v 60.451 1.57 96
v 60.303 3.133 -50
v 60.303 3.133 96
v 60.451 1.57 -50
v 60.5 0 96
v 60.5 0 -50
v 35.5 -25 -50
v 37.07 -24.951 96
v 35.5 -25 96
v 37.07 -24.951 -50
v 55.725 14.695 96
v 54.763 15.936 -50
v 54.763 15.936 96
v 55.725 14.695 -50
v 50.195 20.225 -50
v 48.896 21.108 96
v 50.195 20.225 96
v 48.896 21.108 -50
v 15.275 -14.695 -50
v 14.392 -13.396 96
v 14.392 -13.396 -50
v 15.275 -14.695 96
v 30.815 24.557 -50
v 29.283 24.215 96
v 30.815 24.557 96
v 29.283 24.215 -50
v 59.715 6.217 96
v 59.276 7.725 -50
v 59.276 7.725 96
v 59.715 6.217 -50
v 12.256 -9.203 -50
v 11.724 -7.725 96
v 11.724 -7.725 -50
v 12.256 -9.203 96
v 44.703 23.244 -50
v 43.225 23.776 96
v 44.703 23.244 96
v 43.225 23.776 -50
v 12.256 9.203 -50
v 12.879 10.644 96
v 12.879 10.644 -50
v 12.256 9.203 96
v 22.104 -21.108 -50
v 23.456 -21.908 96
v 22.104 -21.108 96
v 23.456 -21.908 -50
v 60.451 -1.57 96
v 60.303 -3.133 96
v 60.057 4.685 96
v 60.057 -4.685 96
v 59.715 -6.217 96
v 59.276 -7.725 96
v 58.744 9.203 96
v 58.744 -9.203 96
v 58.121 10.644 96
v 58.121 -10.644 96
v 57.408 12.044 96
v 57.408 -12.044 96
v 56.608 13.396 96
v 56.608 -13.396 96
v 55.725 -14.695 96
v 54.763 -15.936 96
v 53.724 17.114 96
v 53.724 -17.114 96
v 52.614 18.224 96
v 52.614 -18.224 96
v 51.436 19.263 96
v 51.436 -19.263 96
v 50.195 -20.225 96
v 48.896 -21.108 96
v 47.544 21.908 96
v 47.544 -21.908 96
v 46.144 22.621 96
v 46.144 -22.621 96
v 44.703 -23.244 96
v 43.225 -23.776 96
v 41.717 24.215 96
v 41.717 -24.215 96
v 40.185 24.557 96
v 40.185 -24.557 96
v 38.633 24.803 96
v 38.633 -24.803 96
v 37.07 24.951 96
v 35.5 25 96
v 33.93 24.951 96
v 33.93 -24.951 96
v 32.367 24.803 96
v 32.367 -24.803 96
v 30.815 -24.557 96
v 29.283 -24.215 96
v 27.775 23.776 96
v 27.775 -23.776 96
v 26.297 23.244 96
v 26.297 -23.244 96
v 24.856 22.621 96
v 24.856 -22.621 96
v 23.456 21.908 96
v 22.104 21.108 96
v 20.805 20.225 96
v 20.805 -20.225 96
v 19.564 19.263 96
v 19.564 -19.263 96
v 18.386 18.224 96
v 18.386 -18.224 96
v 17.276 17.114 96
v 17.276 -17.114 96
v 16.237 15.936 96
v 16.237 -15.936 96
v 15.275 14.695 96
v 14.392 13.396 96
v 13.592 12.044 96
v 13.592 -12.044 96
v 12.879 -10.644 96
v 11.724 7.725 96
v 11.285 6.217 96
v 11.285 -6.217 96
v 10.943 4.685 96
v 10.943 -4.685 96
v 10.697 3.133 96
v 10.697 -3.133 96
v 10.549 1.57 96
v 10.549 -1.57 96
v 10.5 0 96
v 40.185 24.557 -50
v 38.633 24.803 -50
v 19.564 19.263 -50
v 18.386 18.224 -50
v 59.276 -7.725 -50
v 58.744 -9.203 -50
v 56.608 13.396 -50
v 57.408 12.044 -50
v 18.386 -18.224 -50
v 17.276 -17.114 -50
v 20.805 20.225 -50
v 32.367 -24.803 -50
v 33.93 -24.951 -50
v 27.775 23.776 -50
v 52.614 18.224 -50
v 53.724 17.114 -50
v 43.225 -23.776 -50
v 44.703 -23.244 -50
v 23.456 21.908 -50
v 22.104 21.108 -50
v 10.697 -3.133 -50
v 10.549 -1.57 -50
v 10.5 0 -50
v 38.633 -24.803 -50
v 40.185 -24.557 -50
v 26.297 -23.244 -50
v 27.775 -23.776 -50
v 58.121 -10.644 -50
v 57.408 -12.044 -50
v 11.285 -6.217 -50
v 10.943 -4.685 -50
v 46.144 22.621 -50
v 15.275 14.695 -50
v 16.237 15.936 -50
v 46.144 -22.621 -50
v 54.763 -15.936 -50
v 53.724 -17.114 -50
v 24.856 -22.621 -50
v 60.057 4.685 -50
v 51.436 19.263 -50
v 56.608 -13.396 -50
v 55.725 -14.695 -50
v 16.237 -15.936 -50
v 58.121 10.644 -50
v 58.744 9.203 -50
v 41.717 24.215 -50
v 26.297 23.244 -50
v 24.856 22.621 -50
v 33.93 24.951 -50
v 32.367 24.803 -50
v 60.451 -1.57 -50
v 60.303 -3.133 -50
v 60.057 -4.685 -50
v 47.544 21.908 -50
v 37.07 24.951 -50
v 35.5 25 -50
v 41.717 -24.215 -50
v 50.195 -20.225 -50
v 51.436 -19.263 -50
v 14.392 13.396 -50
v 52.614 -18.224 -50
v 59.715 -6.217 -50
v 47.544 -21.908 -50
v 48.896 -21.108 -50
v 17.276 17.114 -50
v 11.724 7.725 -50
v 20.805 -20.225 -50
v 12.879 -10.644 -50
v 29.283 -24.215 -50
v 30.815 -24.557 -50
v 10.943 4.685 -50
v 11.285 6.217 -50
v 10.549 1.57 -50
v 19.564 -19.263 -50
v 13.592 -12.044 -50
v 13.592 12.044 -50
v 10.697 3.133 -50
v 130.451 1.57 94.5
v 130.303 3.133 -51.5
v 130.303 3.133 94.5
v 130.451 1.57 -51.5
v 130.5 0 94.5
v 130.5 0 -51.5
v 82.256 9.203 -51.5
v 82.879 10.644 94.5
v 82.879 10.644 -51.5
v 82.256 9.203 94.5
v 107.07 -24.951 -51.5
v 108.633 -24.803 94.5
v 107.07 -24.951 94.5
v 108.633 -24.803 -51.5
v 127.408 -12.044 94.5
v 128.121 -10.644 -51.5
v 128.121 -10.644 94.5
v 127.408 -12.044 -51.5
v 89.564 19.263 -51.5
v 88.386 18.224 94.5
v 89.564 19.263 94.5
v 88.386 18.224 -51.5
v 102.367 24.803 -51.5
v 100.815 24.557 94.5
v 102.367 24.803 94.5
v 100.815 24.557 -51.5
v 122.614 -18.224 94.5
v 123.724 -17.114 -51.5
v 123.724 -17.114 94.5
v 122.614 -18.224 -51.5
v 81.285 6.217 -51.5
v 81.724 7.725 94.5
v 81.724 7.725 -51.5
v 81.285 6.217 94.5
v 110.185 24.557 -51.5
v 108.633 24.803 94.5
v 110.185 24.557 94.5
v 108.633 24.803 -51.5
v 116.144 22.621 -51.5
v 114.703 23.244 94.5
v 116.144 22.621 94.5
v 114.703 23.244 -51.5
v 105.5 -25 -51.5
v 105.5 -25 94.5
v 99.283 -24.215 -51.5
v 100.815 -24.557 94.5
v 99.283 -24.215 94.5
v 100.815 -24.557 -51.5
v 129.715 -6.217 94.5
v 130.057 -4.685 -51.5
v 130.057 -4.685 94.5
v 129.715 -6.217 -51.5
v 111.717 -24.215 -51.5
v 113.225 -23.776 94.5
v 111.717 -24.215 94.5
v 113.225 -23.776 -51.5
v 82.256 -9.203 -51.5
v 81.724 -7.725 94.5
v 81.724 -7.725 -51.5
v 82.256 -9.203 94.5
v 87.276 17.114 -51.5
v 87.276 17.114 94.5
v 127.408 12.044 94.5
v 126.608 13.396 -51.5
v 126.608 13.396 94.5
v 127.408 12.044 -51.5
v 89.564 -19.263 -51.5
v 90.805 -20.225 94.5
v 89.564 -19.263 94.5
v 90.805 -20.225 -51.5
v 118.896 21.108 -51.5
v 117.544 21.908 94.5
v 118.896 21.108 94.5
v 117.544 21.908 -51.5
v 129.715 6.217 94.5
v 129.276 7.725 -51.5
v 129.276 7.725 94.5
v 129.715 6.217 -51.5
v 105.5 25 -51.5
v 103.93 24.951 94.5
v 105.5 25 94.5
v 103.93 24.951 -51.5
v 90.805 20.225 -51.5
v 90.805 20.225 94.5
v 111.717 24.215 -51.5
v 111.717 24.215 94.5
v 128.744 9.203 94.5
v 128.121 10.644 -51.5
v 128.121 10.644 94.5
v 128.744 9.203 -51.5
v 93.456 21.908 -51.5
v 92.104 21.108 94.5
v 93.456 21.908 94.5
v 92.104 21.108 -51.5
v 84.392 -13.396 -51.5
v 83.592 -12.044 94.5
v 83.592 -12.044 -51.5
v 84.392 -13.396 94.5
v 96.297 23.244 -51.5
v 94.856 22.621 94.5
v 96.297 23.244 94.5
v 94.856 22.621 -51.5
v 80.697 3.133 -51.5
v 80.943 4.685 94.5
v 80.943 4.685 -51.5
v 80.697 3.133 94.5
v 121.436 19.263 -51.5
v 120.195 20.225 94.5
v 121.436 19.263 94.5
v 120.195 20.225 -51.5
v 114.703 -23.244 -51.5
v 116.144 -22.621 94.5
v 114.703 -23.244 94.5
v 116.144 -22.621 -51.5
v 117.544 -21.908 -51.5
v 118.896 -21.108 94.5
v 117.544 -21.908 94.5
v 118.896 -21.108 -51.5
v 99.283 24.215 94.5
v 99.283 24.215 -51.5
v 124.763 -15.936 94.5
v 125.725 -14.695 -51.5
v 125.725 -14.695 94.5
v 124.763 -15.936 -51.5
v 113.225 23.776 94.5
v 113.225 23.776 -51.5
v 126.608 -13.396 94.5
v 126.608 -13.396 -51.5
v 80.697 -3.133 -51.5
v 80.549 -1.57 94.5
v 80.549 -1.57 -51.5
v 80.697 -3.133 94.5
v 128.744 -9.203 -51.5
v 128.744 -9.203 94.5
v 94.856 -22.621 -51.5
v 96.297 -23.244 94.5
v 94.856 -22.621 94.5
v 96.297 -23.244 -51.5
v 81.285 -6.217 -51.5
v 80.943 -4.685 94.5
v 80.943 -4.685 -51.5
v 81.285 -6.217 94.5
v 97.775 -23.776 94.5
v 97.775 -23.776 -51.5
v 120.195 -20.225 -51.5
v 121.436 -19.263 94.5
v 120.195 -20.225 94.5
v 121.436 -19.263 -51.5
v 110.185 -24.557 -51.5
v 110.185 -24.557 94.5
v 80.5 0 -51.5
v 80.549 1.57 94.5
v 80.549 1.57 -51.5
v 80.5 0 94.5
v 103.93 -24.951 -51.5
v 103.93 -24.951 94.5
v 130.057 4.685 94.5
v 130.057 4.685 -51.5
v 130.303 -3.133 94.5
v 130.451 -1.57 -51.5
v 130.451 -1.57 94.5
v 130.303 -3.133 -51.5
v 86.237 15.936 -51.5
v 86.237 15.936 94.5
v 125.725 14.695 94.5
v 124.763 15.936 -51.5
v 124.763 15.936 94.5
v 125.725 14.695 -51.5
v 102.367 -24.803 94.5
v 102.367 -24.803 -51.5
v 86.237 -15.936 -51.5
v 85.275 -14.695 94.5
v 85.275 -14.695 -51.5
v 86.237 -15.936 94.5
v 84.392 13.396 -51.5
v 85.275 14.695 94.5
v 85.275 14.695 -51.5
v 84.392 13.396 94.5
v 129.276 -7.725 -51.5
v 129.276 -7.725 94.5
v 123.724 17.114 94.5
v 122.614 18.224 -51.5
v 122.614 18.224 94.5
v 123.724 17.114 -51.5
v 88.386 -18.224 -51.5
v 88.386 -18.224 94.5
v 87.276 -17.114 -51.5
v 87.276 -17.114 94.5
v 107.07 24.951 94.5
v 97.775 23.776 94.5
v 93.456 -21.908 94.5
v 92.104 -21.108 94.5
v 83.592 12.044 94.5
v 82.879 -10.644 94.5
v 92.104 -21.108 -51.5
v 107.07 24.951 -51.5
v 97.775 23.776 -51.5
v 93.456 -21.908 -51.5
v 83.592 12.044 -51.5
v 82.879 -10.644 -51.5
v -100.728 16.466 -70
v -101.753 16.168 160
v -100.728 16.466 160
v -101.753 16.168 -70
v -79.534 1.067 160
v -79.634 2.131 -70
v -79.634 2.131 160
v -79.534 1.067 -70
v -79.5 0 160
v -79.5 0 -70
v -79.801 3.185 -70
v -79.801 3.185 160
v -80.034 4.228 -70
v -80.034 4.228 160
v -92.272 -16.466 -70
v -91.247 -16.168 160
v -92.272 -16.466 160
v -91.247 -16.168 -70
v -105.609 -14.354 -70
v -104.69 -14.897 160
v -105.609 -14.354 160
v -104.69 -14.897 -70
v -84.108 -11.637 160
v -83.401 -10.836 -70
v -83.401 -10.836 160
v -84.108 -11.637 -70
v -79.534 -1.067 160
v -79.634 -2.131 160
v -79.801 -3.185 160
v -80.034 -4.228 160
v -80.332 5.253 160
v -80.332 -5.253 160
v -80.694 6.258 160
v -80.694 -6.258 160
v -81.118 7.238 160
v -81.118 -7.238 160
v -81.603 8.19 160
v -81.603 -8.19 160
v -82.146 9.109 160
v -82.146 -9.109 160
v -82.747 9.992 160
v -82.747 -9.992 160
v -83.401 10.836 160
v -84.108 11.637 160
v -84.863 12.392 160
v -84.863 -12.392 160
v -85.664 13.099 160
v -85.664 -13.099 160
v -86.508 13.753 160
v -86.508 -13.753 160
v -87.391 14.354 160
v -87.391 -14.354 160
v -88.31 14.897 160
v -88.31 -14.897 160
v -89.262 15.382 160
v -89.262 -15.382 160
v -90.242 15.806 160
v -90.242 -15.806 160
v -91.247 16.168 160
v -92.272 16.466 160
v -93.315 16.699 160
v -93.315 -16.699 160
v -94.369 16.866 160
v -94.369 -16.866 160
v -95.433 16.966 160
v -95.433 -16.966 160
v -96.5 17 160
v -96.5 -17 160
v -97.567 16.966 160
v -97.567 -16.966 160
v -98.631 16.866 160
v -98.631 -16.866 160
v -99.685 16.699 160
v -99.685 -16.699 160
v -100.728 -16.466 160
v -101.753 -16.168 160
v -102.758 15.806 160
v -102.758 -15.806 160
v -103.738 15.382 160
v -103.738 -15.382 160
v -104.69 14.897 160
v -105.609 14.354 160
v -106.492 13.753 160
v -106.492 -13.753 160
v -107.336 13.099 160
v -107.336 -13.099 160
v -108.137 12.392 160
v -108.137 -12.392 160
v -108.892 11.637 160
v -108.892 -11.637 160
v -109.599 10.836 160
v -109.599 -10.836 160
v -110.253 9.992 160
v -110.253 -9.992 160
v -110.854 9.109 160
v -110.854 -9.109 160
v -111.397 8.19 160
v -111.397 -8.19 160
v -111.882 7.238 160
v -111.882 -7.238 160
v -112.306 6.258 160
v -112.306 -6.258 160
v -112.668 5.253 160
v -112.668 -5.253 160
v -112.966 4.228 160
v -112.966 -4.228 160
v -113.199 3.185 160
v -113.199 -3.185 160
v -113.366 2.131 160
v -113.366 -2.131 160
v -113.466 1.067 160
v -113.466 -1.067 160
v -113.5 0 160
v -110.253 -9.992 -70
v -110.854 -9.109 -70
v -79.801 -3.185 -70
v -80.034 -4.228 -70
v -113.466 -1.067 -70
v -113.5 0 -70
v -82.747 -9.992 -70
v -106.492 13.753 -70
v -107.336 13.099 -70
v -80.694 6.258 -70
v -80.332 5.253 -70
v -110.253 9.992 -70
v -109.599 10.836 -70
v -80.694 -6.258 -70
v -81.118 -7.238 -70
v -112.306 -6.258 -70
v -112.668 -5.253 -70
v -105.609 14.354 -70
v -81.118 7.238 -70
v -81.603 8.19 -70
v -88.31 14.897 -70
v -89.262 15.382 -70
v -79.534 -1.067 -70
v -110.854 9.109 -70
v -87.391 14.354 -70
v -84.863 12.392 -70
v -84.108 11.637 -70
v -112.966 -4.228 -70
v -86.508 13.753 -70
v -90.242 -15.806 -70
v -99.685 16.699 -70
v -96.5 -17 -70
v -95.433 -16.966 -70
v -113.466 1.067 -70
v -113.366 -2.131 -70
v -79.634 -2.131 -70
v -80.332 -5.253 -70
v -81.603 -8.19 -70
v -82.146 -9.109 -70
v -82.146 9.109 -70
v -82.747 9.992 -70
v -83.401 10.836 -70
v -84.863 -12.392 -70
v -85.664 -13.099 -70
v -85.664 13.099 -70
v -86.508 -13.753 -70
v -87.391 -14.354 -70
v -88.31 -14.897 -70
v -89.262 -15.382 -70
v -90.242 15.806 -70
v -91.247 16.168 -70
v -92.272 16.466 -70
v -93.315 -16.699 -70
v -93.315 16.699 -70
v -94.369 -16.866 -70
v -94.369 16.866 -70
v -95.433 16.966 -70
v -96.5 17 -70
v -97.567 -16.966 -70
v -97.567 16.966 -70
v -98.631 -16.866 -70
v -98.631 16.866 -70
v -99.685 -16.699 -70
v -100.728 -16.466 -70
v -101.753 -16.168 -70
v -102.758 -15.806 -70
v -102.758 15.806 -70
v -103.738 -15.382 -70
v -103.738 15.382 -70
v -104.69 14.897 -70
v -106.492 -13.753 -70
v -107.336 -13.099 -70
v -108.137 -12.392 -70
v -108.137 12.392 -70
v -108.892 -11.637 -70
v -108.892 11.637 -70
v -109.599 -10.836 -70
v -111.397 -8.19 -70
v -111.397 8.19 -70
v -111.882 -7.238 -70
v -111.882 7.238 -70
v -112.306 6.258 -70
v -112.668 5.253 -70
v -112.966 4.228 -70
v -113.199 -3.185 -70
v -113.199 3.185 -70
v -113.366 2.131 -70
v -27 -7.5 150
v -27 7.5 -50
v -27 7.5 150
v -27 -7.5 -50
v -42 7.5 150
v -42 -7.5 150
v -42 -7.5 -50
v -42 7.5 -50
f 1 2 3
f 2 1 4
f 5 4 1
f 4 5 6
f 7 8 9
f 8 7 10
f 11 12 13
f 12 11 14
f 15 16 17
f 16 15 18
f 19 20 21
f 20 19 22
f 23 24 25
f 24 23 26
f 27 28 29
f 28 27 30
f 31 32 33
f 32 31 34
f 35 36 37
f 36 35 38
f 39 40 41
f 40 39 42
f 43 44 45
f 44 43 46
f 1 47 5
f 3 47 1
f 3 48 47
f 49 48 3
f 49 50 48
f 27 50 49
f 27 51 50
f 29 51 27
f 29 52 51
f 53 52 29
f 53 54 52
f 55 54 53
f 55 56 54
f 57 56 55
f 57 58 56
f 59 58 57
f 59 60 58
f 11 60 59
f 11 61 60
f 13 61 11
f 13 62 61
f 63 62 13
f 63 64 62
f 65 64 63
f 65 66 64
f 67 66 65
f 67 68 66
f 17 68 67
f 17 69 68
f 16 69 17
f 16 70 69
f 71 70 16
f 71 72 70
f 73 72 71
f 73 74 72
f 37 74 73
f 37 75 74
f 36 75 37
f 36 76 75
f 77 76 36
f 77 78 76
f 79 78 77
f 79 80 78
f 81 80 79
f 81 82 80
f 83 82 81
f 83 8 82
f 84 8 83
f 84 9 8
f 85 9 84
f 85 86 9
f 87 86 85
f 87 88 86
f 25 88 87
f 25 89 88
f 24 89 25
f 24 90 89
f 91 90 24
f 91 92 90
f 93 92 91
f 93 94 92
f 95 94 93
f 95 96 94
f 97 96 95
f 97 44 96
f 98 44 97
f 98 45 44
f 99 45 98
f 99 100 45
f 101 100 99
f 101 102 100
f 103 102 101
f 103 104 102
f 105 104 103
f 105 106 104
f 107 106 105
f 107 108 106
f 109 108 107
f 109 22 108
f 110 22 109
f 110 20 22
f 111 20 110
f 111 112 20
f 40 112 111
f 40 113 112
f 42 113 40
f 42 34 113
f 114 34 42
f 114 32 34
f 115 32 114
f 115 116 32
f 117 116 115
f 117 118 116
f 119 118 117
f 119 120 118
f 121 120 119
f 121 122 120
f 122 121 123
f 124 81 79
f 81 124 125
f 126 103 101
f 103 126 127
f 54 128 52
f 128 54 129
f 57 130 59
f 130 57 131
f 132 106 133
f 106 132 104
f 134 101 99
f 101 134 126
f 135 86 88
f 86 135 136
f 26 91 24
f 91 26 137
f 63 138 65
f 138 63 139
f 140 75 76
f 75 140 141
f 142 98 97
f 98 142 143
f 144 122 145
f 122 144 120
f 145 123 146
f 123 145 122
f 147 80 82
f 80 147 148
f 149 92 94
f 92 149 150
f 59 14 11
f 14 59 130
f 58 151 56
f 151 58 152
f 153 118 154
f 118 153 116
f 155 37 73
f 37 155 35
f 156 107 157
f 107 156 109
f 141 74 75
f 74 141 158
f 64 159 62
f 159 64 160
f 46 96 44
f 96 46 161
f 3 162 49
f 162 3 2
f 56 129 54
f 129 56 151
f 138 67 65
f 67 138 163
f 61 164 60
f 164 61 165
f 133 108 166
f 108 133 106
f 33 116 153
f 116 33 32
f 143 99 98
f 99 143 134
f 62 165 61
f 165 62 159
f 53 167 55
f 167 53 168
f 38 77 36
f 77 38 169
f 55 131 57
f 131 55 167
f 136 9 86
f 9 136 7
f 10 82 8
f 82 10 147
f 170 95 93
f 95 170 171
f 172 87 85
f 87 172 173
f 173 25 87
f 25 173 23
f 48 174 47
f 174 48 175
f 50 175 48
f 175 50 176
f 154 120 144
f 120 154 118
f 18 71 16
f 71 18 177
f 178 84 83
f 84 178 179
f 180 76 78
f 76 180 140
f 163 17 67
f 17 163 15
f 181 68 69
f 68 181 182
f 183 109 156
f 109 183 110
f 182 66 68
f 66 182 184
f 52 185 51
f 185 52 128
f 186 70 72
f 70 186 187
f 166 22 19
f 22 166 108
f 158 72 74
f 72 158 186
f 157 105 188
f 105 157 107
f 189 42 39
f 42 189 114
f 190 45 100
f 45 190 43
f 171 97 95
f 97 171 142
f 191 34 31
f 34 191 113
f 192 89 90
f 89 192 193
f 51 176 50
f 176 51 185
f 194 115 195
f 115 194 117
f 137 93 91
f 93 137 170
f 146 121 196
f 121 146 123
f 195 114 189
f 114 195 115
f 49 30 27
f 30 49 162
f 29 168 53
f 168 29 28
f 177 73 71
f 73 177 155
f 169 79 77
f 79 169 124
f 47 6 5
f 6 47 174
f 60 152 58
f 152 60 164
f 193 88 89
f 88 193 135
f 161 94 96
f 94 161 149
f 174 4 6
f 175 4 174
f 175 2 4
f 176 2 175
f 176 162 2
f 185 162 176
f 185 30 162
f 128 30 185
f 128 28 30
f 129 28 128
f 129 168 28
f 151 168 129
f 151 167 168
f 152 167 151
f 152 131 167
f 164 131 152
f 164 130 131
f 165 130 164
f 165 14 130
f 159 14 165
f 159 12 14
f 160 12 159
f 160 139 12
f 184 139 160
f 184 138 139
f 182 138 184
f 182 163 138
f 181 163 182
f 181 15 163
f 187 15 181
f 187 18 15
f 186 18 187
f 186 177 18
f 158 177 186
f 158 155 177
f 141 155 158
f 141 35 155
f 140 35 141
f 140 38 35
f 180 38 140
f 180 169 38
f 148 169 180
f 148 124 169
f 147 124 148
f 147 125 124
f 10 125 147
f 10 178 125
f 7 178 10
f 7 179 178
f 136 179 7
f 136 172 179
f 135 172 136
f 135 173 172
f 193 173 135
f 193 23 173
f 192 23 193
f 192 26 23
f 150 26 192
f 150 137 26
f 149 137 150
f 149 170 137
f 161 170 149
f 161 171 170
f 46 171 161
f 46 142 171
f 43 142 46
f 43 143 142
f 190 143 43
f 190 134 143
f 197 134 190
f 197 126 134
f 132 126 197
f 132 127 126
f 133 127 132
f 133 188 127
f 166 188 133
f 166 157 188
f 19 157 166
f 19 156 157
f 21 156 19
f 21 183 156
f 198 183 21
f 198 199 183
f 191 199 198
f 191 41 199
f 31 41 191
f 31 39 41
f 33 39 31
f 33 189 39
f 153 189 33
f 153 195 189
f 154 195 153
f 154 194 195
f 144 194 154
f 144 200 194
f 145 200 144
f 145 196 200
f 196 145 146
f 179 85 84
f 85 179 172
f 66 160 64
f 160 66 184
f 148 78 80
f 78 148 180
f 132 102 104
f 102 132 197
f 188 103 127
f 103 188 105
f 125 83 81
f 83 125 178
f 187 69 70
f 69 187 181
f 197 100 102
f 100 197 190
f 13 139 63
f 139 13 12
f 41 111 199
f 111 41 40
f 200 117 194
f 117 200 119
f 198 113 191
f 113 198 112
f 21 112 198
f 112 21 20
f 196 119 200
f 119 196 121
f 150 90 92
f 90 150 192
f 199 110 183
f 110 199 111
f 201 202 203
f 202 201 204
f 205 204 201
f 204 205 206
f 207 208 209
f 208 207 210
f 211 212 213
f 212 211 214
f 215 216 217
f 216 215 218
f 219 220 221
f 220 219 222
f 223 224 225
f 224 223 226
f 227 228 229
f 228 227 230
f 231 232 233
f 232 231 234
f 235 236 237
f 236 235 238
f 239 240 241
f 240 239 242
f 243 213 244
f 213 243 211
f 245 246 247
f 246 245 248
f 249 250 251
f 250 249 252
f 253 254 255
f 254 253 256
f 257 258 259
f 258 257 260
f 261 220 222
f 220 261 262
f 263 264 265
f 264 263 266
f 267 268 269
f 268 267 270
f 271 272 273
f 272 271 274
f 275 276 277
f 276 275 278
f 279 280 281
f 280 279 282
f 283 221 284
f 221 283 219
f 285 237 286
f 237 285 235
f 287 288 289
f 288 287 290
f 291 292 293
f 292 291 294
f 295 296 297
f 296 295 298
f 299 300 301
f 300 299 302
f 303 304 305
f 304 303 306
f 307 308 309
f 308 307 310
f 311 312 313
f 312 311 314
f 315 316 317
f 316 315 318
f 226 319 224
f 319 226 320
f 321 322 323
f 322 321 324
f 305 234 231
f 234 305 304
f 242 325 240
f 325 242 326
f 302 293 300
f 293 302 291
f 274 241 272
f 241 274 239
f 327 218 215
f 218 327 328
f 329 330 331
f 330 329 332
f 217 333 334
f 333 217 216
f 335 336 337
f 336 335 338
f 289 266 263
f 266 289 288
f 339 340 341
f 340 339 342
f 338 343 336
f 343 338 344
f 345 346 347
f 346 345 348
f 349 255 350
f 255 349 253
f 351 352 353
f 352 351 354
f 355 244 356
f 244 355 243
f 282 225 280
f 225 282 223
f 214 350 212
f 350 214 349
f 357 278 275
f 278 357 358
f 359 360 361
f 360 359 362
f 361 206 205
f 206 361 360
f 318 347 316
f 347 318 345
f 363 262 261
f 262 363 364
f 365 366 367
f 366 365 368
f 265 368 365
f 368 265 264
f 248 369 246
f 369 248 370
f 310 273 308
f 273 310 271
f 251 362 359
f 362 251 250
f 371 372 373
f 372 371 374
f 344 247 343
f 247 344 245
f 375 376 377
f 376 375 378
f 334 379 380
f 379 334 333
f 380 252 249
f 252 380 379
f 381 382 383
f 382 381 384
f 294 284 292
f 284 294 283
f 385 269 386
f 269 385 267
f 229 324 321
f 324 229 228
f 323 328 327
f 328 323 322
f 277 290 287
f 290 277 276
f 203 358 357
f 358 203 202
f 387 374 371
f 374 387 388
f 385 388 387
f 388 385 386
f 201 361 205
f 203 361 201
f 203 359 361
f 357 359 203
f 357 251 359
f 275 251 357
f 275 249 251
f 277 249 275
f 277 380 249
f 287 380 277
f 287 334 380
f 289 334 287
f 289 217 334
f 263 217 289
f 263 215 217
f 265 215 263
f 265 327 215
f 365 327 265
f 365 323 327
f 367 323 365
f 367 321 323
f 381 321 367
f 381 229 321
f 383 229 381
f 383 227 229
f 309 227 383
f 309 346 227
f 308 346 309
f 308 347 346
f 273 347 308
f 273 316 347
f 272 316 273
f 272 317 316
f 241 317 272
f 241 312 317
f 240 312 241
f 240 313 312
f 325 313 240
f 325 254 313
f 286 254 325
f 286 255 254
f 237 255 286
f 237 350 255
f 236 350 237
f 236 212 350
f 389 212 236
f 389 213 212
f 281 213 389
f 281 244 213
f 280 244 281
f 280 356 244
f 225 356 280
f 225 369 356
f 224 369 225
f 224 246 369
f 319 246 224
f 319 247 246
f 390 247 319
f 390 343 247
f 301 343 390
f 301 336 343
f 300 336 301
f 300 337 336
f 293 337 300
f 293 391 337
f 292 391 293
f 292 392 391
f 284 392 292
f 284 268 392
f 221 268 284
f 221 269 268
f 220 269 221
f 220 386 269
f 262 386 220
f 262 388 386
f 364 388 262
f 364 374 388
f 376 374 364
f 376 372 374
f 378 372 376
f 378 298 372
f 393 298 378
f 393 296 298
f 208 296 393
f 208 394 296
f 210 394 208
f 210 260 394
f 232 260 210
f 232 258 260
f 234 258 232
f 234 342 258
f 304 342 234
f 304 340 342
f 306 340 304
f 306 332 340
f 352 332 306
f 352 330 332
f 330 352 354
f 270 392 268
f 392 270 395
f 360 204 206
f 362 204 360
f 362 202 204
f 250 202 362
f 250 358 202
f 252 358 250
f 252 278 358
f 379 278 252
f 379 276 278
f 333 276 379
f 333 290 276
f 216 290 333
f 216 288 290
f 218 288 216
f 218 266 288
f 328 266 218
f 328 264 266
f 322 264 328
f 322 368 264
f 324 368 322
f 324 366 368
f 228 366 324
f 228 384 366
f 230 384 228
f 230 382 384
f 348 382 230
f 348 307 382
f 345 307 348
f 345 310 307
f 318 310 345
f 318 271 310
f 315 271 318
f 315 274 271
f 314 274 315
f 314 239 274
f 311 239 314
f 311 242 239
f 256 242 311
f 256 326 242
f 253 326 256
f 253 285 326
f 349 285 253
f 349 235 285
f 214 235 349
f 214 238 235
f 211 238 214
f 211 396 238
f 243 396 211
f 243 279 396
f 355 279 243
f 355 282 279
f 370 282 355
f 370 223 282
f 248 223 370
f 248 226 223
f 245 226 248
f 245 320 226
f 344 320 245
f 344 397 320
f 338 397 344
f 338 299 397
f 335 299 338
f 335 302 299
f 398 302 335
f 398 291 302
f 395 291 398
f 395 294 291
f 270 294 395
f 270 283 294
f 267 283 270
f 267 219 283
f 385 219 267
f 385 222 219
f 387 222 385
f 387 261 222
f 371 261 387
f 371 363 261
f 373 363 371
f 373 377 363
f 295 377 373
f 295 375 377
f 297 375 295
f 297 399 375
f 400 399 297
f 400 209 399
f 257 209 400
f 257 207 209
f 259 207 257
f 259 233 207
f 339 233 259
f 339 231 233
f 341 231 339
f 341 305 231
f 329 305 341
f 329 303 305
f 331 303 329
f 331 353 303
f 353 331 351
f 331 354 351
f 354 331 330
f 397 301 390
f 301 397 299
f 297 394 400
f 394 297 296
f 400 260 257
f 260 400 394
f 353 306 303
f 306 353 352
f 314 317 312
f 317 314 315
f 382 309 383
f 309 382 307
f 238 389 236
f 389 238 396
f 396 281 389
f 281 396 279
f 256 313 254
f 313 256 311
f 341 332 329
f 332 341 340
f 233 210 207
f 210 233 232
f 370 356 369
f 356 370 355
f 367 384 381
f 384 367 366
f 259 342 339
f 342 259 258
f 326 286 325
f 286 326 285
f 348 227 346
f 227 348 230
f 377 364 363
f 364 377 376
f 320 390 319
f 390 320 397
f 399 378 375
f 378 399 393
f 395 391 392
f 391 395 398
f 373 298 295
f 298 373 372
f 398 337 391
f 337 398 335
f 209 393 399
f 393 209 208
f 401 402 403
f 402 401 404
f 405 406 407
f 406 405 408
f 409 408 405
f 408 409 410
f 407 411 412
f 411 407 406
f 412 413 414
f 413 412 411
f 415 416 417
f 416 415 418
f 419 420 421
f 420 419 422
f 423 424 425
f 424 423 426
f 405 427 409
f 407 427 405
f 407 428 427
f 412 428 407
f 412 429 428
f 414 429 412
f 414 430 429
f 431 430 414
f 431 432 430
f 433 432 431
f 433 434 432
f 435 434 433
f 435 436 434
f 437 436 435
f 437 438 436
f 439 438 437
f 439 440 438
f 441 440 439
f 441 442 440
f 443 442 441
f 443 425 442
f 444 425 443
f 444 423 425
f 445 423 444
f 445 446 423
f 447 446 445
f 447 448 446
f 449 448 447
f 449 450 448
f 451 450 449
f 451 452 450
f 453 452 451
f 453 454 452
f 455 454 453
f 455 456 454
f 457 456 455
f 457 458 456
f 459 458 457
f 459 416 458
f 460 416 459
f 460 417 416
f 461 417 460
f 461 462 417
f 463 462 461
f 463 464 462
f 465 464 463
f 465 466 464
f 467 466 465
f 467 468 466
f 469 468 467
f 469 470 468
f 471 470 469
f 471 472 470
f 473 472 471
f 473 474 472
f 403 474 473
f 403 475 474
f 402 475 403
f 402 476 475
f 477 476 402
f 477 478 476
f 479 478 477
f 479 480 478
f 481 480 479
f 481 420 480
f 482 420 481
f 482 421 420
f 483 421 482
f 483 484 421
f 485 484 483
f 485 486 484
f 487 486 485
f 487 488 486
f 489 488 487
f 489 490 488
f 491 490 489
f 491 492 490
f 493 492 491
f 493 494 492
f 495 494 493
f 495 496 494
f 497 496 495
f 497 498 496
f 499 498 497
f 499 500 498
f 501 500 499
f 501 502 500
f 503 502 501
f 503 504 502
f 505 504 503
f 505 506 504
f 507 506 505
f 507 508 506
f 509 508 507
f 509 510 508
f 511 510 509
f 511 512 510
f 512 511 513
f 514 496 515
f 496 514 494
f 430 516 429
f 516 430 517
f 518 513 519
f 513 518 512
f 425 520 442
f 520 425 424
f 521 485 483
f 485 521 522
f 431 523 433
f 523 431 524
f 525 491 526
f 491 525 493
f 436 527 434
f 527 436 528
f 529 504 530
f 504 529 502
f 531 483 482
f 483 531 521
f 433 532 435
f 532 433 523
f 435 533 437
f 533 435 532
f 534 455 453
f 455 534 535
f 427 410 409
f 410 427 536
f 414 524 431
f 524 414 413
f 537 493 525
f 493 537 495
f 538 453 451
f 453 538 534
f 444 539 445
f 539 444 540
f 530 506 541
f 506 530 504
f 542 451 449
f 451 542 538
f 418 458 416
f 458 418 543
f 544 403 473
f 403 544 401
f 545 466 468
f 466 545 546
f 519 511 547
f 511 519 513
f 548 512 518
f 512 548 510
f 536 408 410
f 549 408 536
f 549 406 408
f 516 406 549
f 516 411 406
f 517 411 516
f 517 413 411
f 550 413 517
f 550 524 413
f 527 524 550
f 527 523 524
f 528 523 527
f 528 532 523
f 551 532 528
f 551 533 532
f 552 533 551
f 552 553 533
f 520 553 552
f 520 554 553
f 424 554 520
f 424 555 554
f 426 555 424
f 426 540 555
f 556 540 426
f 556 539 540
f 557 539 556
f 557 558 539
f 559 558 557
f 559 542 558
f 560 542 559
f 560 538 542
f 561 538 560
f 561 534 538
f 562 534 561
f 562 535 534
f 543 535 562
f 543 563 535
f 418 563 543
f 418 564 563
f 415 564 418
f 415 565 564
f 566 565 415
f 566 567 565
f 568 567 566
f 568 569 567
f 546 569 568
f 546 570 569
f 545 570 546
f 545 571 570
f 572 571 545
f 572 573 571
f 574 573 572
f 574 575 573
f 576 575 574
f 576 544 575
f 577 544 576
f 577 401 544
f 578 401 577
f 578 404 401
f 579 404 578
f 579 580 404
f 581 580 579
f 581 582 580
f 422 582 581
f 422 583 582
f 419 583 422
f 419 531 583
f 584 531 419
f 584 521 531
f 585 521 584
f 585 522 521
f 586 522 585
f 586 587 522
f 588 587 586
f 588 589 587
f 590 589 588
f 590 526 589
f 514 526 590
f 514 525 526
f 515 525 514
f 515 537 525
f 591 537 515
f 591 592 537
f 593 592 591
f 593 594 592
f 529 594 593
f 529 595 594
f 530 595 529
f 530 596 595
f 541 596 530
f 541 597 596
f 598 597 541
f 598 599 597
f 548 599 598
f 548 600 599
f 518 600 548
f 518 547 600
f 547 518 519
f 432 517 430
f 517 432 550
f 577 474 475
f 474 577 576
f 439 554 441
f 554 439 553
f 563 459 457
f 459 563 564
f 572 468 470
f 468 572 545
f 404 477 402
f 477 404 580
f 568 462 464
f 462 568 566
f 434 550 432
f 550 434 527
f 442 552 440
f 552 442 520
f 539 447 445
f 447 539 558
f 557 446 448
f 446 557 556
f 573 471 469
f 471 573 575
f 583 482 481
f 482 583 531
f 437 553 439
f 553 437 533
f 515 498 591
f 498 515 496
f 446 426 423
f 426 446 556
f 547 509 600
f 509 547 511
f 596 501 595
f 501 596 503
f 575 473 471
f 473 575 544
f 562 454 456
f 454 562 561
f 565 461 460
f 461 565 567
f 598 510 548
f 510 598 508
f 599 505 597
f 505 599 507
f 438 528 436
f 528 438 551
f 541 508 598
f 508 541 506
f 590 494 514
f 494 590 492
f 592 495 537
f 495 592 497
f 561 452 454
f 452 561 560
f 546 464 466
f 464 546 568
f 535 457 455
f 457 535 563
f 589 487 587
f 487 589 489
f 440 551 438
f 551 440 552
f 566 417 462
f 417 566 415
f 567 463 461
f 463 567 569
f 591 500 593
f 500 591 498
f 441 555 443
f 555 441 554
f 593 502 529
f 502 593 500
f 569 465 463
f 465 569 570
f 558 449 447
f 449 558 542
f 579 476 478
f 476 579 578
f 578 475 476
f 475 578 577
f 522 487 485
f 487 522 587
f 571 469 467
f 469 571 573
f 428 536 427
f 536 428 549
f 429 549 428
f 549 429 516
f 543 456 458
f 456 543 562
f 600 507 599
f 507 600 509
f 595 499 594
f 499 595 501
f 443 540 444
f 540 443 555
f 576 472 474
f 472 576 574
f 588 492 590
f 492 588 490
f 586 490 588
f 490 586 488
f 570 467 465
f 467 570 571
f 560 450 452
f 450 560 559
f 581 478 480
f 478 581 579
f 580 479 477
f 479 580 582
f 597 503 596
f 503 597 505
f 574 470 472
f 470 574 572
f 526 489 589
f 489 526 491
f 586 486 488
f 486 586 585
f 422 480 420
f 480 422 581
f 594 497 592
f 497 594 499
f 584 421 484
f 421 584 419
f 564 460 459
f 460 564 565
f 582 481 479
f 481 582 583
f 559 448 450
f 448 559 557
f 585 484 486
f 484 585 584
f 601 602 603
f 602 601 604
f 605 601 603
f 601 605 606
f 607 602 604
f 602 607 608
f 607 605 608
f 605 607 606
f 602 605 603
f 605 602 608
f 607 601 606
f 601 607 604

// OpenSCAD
$fn = 100;
translate(v = [-113.5, 0, 0])
{
  translate(v = [17, 0, 0])
  {
    union()
    {
      translate(v = [0, 0, 45])
      {
        cylinder(h = 230, r = 17, center = true);
      }
      translate(v = [0, 0, 50])
      {
        translate(v = [62, 0, 0])
        {
          cube(size = [15, 15, 200], center = true);
        }
      }
      translate(v = [167, 0, 0])
      {
        translate(v = [-35, 0, 0])
        {
          union()
          {
            translate(v = [0, 0, 23])
            {
              cylinder(h = 146, r = 25, center = true);
            }
            translate(v = [0, 0, 21.5])
            {
              translate(v = [70, 0, 0])
              {
                cylinder(h = 146, r = 25, center = true);
              }
            }
          }
        }
      }
    }
  }
}
